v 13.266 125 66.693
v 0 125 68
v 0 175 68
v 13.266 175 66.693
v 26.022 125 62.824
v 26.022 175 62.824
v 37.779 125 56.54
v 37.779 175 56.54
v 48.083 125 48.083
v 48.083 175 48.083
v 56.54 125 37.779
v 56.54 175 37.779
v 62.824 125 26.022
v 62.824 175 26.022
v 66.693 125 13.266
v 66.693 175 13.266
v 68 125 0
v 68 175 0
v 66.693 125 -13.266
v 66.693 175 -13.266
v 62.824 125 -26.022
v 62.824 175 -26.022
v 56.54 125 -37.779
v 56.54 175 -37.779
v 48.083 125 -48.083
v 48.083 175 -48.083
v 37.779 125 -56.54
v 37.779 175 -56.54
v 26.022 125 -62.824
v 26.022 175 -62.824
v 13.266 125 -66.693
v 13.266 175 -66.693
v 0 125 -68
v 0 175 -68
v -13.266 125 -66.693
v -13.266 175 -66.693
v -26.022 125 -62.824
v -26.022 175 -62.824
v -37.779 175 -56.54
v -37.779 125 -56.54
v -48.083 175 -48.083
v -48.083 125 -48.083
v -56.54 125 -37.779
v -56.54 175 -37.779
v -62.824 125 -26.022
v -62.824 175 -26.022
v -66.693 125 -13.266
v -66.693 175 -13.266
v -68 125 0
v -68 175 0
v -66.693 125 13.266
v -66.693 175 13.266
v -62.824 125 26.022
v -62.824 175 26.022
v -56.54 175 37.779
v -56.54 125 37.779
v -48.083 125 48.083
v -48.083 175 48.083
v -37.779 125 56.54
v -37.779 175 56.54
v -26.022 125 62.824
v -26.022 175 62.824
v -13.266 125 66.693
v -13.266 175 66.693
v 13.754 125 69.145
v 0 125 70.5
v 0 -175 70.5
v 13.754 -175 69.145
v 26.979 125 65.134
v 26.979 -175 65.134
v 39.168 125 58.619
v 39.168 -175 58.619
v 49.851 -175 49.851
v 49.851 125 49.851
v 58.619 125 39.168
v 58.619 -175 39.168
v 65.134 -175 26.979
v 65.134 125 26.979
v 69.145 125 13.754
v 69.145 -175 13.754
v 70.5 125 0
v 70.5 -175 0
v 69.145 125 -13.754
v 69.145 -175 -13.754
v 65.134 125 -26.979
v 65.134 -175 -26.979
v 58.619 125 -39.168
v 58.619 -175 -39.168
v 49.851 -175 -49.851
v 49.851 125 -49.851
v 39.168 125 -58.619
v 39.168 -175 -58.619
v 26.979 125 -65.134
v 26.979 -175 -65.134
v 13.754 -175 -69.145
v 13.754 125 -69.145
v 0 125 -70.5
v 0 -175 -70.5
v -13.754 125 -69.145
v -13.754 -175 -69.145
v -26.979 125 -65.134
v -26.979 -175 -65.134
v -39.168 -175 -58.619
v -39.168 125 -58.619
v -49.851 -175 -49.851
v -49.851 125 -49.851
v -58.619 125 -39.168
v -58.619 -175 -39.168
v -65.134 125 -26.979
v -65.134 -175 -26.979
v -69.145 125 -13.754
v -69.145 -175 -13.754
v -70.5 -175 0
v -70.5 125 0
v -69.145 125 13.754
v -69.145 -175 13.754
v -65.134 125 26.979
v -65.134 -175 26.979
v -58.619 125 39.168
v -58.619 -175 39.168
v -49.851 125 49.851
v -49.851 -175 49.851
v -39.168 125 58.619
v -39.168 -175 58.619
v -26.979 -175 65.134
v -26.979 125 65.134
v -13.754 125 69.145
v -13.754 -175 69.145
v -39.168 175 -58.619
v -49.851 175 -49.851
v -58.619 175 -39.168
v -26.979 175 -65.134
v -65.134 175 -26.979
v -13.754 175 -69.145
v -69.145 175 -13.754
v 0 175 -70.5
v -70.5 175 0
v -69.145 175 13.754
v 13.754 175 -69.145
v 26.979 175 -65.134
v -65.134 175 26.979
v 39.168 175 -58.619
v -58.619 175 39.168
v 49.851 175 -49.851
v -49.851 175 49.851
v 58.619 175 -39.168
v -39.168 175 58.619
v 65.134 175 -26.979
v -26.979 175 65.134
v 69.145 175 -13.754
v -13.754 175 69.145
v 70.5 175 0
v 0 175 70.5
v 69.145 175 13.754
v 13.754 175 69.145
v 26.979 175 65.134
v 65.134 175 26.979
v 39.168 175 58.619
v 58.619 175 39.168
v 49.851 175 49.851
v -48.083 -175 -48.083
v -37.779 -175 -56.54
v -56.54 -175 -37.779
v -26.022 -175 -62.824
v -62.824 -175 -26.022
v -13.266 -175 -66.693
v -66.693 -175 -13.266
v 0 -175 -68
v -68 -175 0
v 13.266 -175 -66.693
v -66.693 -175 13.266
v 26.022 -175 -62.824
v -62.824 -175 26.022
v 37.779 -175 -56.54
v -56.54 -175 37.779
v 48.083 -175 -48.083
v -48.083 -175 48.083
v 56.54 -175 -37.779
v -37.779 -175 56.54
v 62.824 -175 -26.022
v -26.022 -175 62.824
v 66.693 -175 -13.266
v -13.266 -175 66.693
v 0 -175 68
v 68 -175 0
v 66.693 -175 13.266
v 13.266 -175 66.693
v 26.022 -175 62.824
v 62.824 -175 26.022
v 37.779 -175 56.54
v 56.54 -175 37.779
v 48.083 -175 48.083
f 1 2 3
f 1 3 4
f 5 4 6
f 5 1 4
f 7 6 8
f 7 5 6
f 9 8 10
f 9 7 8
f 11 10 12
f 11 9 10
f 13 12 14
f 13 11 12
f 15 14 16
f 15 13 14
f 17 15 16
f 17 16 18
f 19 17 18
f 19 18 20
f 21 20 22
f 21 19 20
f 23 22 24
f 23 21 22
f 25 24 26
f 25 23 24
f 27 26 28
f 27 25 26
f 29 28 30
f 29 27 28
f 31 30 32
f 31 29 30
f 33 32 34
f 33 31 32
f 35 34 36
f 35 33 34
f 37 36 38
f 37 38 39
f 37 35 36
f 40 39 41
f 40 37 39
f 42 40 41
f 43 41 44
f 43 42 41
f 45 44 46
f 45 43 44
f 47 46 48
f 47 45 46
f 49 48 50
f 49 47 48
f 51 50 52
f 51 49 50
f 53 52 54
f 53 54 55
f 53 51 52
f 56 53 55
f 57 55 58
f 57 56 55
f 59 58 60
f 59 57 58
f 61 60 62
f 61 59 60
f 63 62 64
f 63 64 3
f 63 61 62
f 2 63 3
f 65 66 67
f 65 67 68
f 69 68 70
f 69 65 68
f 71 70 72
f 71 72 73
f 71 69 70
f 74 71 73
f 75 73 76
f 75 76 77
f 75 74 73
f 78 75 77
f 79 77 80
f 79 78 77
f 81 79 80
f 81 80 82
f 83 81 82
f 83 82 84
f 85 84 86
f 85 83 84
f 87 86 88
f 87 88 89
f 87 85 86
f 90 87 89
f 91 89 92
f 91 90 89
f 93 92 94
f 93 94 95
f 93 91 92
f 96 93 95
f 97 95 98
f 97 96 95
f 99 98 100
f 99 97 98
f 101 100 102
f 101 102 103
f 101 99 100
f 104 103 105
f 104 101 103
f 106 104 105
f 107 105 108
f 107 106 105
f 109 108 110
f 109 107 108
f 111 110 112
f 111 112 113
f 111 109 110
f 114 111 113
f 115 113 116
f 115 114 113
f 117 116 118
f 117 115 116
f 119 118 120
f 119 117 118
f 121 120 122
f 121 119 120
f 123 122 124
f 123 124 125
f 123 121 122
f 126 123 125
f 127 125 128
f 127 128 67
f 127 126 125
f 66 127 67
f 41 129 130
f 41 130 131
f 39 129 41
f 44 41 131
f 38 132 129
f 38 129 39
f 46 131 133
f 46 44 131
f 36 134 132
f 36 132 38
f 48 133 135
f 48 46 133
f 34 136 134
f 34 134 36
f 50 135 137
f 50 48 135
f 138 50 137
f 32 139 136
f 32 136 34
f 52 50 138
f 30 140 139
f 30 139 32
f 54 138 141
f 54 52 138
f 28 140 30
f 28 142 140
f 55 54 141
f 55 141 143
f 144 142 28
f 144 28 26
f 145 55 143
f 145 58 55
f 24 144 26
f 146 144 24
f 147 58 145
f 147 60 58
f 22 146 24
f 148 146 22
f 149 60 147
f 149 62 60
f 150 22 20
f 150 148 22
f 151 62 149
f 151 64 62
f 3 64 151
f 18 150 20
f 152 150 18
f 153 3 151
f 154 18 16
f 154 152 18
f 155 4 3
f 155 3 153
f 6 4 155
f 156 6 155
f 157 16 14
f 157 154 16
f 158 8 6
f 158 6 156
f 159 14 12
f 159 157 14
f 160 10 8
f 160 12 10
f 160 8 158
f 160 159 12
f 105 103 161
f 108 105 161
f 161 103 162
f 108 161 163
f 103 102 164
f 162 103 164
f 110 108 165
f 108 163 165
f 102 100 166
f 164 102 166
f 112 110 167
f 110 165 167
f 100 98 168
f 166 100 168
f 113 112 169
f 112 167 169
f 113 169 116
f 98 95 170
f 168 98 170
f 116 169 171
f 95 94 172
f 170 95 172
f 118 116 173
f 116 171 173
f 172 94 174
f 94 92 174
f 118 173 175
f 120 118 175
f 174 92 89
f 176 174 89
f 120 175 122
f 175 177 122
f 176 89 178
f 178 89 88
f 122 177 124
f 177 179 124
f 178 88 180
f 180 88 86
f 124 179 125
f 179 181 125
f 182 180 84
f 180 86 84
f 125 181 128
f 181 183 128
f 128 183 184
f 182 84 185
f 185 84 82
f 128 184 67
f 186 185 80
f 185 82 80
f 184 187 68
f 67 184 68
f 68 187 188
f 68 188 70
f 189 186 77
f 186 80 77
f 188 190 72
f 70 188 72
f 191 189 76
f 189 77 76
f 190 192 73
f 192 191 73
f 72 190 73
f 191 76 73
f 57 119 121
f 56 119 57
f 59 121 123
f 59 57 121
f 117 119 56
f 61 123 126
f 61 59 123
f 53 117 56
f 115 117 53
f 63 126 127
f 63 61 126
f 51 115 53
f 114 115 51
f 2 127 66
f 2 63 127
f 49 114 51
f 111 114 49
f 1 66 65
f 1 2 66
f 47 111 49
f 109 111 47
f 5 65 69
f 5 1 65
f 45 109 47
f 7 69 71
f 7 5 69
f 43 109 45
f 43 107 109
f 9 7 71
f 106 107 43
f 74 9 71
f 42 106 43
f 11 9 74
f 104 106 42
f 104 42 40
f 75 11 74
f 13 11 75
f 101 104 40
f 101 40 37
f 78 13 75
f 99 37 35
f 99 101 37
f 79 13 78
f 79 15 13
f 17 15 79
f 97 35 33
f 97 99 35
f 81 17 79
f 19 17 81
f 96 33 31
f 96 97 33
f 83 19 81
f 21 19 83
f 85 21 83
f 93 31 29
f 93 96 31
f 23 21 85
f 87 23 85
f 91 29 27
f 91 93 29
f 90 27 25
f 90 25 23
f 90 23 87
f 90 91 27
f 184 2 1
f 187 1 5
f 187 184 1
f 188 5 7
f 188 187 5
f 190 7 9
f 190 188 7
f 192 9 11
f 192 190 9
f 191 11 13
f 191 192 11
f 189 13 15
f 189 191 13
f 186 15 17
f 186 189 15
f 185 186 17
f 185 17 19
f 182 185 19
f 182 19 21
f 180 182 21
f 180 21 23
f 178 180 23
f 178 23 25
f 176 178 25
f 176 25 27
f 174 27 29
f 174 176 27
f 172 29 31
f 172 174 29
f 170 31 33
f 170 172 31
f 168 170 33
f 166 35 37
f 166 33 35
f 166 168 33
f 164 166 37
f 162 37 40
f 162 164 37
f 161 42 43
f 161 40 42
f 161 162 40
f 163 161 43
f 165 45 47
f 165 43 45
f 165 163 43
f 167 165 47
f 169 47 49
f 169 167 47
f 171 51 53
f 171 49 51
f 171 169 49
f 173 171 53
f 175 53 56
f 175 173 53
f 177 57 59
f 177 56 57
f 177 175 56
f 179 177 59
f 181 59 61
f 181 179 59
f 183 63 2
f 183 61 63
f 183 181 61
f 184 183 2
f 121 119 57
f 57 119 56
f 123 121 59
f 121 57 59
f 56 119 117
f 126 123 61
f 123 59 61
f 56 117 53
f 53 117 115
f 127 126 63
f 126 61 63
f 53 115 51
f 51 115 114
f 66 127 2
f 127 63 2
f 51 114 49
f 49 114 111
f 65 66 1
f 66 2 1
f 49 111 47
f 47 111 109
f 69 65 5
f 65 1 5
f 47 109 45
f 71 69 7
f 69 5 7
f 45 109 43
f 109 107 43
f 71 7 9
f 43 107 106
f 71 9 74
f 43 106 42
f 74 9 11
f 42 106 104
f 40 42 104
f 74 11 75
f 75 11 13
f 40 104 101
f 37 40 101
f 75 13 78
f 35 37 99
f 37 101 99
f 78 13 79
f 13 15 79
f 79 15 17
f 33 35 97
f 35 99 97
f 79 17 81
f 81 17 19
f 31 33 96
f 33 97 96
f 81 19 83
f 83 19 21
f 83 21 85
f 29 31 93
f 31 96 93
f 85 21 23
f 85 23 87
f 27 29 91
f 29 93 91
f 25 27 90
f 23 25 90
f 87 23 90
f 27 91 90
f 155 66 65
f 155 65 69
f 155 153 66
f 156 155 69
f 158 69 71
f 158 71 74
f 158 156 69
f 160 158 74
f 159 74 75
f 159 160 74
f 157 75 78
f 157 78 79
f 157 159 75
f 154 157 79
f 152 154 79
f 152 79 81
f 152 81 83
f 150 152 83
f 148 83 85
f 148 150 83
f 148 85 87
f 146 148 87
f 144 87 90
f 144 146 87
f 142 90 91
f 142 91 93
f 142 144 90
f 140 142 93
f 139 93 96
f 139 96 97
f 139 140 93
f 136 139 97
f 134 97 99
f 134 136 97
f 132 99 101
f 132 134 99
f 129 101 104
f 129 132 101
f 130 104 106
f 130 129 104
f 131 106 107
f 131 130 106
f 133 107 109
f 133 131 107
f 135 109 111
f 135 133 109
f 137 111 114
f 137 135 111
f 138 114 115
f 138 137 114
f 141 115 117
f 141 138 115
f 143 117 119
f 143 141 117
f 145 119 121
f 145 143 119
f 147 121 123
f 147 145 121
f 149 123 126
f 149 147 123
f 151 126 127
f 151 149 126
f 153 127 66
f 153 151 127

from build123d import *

# Parameters (mm, degrees)
SKETCH2_R           = 70.5
SKETCH2_R_2         = 68
BOSS_EXTRUDE1_DEPTH = 175


# Read off the part's stored shape, not the designer's step: Split1
with BuildPart() as part:
    # Sketch2 → Boss-Extrude1 (new, symmetric)
    with BuildSketch(Plane(origin=(0, 0, 0), x_dir=(1, 0, 0), z_dir=(0, 1, 0))):
        with Locations(Location((0, 0, 0), (0, 0, 270))):
            Circle(SKETCH2_R)
        with Locations(Location((0, 0, 0), (0, 0, 270))):
            Circle(SKETCH2_R_2, mode=Mode.SUBTRACT)
    extrude(amount=BOSS_EXTRUDE1_DEPTH, both=True)


with BuildPart() as body_2:
    # Split1: the piece on the far side of the plane
    add(part.part)
    split(bisect_by=Plane(origin=(0, 125, 0), x_dir=(1, 0, 0), z_dir=(0, 1, 0)), keep=Keep.BOTTOM)


with BuildPart() as part_1:
    add(part.part)

    # Split1
    split(bisect_by=Plane(origin=(0, 125, 0), x_dir=(1, 0, 0), z_dir=(0, 1, 0)), keep=Keep.TOP)


solid = Compound([body_2.part, part_1.part])
